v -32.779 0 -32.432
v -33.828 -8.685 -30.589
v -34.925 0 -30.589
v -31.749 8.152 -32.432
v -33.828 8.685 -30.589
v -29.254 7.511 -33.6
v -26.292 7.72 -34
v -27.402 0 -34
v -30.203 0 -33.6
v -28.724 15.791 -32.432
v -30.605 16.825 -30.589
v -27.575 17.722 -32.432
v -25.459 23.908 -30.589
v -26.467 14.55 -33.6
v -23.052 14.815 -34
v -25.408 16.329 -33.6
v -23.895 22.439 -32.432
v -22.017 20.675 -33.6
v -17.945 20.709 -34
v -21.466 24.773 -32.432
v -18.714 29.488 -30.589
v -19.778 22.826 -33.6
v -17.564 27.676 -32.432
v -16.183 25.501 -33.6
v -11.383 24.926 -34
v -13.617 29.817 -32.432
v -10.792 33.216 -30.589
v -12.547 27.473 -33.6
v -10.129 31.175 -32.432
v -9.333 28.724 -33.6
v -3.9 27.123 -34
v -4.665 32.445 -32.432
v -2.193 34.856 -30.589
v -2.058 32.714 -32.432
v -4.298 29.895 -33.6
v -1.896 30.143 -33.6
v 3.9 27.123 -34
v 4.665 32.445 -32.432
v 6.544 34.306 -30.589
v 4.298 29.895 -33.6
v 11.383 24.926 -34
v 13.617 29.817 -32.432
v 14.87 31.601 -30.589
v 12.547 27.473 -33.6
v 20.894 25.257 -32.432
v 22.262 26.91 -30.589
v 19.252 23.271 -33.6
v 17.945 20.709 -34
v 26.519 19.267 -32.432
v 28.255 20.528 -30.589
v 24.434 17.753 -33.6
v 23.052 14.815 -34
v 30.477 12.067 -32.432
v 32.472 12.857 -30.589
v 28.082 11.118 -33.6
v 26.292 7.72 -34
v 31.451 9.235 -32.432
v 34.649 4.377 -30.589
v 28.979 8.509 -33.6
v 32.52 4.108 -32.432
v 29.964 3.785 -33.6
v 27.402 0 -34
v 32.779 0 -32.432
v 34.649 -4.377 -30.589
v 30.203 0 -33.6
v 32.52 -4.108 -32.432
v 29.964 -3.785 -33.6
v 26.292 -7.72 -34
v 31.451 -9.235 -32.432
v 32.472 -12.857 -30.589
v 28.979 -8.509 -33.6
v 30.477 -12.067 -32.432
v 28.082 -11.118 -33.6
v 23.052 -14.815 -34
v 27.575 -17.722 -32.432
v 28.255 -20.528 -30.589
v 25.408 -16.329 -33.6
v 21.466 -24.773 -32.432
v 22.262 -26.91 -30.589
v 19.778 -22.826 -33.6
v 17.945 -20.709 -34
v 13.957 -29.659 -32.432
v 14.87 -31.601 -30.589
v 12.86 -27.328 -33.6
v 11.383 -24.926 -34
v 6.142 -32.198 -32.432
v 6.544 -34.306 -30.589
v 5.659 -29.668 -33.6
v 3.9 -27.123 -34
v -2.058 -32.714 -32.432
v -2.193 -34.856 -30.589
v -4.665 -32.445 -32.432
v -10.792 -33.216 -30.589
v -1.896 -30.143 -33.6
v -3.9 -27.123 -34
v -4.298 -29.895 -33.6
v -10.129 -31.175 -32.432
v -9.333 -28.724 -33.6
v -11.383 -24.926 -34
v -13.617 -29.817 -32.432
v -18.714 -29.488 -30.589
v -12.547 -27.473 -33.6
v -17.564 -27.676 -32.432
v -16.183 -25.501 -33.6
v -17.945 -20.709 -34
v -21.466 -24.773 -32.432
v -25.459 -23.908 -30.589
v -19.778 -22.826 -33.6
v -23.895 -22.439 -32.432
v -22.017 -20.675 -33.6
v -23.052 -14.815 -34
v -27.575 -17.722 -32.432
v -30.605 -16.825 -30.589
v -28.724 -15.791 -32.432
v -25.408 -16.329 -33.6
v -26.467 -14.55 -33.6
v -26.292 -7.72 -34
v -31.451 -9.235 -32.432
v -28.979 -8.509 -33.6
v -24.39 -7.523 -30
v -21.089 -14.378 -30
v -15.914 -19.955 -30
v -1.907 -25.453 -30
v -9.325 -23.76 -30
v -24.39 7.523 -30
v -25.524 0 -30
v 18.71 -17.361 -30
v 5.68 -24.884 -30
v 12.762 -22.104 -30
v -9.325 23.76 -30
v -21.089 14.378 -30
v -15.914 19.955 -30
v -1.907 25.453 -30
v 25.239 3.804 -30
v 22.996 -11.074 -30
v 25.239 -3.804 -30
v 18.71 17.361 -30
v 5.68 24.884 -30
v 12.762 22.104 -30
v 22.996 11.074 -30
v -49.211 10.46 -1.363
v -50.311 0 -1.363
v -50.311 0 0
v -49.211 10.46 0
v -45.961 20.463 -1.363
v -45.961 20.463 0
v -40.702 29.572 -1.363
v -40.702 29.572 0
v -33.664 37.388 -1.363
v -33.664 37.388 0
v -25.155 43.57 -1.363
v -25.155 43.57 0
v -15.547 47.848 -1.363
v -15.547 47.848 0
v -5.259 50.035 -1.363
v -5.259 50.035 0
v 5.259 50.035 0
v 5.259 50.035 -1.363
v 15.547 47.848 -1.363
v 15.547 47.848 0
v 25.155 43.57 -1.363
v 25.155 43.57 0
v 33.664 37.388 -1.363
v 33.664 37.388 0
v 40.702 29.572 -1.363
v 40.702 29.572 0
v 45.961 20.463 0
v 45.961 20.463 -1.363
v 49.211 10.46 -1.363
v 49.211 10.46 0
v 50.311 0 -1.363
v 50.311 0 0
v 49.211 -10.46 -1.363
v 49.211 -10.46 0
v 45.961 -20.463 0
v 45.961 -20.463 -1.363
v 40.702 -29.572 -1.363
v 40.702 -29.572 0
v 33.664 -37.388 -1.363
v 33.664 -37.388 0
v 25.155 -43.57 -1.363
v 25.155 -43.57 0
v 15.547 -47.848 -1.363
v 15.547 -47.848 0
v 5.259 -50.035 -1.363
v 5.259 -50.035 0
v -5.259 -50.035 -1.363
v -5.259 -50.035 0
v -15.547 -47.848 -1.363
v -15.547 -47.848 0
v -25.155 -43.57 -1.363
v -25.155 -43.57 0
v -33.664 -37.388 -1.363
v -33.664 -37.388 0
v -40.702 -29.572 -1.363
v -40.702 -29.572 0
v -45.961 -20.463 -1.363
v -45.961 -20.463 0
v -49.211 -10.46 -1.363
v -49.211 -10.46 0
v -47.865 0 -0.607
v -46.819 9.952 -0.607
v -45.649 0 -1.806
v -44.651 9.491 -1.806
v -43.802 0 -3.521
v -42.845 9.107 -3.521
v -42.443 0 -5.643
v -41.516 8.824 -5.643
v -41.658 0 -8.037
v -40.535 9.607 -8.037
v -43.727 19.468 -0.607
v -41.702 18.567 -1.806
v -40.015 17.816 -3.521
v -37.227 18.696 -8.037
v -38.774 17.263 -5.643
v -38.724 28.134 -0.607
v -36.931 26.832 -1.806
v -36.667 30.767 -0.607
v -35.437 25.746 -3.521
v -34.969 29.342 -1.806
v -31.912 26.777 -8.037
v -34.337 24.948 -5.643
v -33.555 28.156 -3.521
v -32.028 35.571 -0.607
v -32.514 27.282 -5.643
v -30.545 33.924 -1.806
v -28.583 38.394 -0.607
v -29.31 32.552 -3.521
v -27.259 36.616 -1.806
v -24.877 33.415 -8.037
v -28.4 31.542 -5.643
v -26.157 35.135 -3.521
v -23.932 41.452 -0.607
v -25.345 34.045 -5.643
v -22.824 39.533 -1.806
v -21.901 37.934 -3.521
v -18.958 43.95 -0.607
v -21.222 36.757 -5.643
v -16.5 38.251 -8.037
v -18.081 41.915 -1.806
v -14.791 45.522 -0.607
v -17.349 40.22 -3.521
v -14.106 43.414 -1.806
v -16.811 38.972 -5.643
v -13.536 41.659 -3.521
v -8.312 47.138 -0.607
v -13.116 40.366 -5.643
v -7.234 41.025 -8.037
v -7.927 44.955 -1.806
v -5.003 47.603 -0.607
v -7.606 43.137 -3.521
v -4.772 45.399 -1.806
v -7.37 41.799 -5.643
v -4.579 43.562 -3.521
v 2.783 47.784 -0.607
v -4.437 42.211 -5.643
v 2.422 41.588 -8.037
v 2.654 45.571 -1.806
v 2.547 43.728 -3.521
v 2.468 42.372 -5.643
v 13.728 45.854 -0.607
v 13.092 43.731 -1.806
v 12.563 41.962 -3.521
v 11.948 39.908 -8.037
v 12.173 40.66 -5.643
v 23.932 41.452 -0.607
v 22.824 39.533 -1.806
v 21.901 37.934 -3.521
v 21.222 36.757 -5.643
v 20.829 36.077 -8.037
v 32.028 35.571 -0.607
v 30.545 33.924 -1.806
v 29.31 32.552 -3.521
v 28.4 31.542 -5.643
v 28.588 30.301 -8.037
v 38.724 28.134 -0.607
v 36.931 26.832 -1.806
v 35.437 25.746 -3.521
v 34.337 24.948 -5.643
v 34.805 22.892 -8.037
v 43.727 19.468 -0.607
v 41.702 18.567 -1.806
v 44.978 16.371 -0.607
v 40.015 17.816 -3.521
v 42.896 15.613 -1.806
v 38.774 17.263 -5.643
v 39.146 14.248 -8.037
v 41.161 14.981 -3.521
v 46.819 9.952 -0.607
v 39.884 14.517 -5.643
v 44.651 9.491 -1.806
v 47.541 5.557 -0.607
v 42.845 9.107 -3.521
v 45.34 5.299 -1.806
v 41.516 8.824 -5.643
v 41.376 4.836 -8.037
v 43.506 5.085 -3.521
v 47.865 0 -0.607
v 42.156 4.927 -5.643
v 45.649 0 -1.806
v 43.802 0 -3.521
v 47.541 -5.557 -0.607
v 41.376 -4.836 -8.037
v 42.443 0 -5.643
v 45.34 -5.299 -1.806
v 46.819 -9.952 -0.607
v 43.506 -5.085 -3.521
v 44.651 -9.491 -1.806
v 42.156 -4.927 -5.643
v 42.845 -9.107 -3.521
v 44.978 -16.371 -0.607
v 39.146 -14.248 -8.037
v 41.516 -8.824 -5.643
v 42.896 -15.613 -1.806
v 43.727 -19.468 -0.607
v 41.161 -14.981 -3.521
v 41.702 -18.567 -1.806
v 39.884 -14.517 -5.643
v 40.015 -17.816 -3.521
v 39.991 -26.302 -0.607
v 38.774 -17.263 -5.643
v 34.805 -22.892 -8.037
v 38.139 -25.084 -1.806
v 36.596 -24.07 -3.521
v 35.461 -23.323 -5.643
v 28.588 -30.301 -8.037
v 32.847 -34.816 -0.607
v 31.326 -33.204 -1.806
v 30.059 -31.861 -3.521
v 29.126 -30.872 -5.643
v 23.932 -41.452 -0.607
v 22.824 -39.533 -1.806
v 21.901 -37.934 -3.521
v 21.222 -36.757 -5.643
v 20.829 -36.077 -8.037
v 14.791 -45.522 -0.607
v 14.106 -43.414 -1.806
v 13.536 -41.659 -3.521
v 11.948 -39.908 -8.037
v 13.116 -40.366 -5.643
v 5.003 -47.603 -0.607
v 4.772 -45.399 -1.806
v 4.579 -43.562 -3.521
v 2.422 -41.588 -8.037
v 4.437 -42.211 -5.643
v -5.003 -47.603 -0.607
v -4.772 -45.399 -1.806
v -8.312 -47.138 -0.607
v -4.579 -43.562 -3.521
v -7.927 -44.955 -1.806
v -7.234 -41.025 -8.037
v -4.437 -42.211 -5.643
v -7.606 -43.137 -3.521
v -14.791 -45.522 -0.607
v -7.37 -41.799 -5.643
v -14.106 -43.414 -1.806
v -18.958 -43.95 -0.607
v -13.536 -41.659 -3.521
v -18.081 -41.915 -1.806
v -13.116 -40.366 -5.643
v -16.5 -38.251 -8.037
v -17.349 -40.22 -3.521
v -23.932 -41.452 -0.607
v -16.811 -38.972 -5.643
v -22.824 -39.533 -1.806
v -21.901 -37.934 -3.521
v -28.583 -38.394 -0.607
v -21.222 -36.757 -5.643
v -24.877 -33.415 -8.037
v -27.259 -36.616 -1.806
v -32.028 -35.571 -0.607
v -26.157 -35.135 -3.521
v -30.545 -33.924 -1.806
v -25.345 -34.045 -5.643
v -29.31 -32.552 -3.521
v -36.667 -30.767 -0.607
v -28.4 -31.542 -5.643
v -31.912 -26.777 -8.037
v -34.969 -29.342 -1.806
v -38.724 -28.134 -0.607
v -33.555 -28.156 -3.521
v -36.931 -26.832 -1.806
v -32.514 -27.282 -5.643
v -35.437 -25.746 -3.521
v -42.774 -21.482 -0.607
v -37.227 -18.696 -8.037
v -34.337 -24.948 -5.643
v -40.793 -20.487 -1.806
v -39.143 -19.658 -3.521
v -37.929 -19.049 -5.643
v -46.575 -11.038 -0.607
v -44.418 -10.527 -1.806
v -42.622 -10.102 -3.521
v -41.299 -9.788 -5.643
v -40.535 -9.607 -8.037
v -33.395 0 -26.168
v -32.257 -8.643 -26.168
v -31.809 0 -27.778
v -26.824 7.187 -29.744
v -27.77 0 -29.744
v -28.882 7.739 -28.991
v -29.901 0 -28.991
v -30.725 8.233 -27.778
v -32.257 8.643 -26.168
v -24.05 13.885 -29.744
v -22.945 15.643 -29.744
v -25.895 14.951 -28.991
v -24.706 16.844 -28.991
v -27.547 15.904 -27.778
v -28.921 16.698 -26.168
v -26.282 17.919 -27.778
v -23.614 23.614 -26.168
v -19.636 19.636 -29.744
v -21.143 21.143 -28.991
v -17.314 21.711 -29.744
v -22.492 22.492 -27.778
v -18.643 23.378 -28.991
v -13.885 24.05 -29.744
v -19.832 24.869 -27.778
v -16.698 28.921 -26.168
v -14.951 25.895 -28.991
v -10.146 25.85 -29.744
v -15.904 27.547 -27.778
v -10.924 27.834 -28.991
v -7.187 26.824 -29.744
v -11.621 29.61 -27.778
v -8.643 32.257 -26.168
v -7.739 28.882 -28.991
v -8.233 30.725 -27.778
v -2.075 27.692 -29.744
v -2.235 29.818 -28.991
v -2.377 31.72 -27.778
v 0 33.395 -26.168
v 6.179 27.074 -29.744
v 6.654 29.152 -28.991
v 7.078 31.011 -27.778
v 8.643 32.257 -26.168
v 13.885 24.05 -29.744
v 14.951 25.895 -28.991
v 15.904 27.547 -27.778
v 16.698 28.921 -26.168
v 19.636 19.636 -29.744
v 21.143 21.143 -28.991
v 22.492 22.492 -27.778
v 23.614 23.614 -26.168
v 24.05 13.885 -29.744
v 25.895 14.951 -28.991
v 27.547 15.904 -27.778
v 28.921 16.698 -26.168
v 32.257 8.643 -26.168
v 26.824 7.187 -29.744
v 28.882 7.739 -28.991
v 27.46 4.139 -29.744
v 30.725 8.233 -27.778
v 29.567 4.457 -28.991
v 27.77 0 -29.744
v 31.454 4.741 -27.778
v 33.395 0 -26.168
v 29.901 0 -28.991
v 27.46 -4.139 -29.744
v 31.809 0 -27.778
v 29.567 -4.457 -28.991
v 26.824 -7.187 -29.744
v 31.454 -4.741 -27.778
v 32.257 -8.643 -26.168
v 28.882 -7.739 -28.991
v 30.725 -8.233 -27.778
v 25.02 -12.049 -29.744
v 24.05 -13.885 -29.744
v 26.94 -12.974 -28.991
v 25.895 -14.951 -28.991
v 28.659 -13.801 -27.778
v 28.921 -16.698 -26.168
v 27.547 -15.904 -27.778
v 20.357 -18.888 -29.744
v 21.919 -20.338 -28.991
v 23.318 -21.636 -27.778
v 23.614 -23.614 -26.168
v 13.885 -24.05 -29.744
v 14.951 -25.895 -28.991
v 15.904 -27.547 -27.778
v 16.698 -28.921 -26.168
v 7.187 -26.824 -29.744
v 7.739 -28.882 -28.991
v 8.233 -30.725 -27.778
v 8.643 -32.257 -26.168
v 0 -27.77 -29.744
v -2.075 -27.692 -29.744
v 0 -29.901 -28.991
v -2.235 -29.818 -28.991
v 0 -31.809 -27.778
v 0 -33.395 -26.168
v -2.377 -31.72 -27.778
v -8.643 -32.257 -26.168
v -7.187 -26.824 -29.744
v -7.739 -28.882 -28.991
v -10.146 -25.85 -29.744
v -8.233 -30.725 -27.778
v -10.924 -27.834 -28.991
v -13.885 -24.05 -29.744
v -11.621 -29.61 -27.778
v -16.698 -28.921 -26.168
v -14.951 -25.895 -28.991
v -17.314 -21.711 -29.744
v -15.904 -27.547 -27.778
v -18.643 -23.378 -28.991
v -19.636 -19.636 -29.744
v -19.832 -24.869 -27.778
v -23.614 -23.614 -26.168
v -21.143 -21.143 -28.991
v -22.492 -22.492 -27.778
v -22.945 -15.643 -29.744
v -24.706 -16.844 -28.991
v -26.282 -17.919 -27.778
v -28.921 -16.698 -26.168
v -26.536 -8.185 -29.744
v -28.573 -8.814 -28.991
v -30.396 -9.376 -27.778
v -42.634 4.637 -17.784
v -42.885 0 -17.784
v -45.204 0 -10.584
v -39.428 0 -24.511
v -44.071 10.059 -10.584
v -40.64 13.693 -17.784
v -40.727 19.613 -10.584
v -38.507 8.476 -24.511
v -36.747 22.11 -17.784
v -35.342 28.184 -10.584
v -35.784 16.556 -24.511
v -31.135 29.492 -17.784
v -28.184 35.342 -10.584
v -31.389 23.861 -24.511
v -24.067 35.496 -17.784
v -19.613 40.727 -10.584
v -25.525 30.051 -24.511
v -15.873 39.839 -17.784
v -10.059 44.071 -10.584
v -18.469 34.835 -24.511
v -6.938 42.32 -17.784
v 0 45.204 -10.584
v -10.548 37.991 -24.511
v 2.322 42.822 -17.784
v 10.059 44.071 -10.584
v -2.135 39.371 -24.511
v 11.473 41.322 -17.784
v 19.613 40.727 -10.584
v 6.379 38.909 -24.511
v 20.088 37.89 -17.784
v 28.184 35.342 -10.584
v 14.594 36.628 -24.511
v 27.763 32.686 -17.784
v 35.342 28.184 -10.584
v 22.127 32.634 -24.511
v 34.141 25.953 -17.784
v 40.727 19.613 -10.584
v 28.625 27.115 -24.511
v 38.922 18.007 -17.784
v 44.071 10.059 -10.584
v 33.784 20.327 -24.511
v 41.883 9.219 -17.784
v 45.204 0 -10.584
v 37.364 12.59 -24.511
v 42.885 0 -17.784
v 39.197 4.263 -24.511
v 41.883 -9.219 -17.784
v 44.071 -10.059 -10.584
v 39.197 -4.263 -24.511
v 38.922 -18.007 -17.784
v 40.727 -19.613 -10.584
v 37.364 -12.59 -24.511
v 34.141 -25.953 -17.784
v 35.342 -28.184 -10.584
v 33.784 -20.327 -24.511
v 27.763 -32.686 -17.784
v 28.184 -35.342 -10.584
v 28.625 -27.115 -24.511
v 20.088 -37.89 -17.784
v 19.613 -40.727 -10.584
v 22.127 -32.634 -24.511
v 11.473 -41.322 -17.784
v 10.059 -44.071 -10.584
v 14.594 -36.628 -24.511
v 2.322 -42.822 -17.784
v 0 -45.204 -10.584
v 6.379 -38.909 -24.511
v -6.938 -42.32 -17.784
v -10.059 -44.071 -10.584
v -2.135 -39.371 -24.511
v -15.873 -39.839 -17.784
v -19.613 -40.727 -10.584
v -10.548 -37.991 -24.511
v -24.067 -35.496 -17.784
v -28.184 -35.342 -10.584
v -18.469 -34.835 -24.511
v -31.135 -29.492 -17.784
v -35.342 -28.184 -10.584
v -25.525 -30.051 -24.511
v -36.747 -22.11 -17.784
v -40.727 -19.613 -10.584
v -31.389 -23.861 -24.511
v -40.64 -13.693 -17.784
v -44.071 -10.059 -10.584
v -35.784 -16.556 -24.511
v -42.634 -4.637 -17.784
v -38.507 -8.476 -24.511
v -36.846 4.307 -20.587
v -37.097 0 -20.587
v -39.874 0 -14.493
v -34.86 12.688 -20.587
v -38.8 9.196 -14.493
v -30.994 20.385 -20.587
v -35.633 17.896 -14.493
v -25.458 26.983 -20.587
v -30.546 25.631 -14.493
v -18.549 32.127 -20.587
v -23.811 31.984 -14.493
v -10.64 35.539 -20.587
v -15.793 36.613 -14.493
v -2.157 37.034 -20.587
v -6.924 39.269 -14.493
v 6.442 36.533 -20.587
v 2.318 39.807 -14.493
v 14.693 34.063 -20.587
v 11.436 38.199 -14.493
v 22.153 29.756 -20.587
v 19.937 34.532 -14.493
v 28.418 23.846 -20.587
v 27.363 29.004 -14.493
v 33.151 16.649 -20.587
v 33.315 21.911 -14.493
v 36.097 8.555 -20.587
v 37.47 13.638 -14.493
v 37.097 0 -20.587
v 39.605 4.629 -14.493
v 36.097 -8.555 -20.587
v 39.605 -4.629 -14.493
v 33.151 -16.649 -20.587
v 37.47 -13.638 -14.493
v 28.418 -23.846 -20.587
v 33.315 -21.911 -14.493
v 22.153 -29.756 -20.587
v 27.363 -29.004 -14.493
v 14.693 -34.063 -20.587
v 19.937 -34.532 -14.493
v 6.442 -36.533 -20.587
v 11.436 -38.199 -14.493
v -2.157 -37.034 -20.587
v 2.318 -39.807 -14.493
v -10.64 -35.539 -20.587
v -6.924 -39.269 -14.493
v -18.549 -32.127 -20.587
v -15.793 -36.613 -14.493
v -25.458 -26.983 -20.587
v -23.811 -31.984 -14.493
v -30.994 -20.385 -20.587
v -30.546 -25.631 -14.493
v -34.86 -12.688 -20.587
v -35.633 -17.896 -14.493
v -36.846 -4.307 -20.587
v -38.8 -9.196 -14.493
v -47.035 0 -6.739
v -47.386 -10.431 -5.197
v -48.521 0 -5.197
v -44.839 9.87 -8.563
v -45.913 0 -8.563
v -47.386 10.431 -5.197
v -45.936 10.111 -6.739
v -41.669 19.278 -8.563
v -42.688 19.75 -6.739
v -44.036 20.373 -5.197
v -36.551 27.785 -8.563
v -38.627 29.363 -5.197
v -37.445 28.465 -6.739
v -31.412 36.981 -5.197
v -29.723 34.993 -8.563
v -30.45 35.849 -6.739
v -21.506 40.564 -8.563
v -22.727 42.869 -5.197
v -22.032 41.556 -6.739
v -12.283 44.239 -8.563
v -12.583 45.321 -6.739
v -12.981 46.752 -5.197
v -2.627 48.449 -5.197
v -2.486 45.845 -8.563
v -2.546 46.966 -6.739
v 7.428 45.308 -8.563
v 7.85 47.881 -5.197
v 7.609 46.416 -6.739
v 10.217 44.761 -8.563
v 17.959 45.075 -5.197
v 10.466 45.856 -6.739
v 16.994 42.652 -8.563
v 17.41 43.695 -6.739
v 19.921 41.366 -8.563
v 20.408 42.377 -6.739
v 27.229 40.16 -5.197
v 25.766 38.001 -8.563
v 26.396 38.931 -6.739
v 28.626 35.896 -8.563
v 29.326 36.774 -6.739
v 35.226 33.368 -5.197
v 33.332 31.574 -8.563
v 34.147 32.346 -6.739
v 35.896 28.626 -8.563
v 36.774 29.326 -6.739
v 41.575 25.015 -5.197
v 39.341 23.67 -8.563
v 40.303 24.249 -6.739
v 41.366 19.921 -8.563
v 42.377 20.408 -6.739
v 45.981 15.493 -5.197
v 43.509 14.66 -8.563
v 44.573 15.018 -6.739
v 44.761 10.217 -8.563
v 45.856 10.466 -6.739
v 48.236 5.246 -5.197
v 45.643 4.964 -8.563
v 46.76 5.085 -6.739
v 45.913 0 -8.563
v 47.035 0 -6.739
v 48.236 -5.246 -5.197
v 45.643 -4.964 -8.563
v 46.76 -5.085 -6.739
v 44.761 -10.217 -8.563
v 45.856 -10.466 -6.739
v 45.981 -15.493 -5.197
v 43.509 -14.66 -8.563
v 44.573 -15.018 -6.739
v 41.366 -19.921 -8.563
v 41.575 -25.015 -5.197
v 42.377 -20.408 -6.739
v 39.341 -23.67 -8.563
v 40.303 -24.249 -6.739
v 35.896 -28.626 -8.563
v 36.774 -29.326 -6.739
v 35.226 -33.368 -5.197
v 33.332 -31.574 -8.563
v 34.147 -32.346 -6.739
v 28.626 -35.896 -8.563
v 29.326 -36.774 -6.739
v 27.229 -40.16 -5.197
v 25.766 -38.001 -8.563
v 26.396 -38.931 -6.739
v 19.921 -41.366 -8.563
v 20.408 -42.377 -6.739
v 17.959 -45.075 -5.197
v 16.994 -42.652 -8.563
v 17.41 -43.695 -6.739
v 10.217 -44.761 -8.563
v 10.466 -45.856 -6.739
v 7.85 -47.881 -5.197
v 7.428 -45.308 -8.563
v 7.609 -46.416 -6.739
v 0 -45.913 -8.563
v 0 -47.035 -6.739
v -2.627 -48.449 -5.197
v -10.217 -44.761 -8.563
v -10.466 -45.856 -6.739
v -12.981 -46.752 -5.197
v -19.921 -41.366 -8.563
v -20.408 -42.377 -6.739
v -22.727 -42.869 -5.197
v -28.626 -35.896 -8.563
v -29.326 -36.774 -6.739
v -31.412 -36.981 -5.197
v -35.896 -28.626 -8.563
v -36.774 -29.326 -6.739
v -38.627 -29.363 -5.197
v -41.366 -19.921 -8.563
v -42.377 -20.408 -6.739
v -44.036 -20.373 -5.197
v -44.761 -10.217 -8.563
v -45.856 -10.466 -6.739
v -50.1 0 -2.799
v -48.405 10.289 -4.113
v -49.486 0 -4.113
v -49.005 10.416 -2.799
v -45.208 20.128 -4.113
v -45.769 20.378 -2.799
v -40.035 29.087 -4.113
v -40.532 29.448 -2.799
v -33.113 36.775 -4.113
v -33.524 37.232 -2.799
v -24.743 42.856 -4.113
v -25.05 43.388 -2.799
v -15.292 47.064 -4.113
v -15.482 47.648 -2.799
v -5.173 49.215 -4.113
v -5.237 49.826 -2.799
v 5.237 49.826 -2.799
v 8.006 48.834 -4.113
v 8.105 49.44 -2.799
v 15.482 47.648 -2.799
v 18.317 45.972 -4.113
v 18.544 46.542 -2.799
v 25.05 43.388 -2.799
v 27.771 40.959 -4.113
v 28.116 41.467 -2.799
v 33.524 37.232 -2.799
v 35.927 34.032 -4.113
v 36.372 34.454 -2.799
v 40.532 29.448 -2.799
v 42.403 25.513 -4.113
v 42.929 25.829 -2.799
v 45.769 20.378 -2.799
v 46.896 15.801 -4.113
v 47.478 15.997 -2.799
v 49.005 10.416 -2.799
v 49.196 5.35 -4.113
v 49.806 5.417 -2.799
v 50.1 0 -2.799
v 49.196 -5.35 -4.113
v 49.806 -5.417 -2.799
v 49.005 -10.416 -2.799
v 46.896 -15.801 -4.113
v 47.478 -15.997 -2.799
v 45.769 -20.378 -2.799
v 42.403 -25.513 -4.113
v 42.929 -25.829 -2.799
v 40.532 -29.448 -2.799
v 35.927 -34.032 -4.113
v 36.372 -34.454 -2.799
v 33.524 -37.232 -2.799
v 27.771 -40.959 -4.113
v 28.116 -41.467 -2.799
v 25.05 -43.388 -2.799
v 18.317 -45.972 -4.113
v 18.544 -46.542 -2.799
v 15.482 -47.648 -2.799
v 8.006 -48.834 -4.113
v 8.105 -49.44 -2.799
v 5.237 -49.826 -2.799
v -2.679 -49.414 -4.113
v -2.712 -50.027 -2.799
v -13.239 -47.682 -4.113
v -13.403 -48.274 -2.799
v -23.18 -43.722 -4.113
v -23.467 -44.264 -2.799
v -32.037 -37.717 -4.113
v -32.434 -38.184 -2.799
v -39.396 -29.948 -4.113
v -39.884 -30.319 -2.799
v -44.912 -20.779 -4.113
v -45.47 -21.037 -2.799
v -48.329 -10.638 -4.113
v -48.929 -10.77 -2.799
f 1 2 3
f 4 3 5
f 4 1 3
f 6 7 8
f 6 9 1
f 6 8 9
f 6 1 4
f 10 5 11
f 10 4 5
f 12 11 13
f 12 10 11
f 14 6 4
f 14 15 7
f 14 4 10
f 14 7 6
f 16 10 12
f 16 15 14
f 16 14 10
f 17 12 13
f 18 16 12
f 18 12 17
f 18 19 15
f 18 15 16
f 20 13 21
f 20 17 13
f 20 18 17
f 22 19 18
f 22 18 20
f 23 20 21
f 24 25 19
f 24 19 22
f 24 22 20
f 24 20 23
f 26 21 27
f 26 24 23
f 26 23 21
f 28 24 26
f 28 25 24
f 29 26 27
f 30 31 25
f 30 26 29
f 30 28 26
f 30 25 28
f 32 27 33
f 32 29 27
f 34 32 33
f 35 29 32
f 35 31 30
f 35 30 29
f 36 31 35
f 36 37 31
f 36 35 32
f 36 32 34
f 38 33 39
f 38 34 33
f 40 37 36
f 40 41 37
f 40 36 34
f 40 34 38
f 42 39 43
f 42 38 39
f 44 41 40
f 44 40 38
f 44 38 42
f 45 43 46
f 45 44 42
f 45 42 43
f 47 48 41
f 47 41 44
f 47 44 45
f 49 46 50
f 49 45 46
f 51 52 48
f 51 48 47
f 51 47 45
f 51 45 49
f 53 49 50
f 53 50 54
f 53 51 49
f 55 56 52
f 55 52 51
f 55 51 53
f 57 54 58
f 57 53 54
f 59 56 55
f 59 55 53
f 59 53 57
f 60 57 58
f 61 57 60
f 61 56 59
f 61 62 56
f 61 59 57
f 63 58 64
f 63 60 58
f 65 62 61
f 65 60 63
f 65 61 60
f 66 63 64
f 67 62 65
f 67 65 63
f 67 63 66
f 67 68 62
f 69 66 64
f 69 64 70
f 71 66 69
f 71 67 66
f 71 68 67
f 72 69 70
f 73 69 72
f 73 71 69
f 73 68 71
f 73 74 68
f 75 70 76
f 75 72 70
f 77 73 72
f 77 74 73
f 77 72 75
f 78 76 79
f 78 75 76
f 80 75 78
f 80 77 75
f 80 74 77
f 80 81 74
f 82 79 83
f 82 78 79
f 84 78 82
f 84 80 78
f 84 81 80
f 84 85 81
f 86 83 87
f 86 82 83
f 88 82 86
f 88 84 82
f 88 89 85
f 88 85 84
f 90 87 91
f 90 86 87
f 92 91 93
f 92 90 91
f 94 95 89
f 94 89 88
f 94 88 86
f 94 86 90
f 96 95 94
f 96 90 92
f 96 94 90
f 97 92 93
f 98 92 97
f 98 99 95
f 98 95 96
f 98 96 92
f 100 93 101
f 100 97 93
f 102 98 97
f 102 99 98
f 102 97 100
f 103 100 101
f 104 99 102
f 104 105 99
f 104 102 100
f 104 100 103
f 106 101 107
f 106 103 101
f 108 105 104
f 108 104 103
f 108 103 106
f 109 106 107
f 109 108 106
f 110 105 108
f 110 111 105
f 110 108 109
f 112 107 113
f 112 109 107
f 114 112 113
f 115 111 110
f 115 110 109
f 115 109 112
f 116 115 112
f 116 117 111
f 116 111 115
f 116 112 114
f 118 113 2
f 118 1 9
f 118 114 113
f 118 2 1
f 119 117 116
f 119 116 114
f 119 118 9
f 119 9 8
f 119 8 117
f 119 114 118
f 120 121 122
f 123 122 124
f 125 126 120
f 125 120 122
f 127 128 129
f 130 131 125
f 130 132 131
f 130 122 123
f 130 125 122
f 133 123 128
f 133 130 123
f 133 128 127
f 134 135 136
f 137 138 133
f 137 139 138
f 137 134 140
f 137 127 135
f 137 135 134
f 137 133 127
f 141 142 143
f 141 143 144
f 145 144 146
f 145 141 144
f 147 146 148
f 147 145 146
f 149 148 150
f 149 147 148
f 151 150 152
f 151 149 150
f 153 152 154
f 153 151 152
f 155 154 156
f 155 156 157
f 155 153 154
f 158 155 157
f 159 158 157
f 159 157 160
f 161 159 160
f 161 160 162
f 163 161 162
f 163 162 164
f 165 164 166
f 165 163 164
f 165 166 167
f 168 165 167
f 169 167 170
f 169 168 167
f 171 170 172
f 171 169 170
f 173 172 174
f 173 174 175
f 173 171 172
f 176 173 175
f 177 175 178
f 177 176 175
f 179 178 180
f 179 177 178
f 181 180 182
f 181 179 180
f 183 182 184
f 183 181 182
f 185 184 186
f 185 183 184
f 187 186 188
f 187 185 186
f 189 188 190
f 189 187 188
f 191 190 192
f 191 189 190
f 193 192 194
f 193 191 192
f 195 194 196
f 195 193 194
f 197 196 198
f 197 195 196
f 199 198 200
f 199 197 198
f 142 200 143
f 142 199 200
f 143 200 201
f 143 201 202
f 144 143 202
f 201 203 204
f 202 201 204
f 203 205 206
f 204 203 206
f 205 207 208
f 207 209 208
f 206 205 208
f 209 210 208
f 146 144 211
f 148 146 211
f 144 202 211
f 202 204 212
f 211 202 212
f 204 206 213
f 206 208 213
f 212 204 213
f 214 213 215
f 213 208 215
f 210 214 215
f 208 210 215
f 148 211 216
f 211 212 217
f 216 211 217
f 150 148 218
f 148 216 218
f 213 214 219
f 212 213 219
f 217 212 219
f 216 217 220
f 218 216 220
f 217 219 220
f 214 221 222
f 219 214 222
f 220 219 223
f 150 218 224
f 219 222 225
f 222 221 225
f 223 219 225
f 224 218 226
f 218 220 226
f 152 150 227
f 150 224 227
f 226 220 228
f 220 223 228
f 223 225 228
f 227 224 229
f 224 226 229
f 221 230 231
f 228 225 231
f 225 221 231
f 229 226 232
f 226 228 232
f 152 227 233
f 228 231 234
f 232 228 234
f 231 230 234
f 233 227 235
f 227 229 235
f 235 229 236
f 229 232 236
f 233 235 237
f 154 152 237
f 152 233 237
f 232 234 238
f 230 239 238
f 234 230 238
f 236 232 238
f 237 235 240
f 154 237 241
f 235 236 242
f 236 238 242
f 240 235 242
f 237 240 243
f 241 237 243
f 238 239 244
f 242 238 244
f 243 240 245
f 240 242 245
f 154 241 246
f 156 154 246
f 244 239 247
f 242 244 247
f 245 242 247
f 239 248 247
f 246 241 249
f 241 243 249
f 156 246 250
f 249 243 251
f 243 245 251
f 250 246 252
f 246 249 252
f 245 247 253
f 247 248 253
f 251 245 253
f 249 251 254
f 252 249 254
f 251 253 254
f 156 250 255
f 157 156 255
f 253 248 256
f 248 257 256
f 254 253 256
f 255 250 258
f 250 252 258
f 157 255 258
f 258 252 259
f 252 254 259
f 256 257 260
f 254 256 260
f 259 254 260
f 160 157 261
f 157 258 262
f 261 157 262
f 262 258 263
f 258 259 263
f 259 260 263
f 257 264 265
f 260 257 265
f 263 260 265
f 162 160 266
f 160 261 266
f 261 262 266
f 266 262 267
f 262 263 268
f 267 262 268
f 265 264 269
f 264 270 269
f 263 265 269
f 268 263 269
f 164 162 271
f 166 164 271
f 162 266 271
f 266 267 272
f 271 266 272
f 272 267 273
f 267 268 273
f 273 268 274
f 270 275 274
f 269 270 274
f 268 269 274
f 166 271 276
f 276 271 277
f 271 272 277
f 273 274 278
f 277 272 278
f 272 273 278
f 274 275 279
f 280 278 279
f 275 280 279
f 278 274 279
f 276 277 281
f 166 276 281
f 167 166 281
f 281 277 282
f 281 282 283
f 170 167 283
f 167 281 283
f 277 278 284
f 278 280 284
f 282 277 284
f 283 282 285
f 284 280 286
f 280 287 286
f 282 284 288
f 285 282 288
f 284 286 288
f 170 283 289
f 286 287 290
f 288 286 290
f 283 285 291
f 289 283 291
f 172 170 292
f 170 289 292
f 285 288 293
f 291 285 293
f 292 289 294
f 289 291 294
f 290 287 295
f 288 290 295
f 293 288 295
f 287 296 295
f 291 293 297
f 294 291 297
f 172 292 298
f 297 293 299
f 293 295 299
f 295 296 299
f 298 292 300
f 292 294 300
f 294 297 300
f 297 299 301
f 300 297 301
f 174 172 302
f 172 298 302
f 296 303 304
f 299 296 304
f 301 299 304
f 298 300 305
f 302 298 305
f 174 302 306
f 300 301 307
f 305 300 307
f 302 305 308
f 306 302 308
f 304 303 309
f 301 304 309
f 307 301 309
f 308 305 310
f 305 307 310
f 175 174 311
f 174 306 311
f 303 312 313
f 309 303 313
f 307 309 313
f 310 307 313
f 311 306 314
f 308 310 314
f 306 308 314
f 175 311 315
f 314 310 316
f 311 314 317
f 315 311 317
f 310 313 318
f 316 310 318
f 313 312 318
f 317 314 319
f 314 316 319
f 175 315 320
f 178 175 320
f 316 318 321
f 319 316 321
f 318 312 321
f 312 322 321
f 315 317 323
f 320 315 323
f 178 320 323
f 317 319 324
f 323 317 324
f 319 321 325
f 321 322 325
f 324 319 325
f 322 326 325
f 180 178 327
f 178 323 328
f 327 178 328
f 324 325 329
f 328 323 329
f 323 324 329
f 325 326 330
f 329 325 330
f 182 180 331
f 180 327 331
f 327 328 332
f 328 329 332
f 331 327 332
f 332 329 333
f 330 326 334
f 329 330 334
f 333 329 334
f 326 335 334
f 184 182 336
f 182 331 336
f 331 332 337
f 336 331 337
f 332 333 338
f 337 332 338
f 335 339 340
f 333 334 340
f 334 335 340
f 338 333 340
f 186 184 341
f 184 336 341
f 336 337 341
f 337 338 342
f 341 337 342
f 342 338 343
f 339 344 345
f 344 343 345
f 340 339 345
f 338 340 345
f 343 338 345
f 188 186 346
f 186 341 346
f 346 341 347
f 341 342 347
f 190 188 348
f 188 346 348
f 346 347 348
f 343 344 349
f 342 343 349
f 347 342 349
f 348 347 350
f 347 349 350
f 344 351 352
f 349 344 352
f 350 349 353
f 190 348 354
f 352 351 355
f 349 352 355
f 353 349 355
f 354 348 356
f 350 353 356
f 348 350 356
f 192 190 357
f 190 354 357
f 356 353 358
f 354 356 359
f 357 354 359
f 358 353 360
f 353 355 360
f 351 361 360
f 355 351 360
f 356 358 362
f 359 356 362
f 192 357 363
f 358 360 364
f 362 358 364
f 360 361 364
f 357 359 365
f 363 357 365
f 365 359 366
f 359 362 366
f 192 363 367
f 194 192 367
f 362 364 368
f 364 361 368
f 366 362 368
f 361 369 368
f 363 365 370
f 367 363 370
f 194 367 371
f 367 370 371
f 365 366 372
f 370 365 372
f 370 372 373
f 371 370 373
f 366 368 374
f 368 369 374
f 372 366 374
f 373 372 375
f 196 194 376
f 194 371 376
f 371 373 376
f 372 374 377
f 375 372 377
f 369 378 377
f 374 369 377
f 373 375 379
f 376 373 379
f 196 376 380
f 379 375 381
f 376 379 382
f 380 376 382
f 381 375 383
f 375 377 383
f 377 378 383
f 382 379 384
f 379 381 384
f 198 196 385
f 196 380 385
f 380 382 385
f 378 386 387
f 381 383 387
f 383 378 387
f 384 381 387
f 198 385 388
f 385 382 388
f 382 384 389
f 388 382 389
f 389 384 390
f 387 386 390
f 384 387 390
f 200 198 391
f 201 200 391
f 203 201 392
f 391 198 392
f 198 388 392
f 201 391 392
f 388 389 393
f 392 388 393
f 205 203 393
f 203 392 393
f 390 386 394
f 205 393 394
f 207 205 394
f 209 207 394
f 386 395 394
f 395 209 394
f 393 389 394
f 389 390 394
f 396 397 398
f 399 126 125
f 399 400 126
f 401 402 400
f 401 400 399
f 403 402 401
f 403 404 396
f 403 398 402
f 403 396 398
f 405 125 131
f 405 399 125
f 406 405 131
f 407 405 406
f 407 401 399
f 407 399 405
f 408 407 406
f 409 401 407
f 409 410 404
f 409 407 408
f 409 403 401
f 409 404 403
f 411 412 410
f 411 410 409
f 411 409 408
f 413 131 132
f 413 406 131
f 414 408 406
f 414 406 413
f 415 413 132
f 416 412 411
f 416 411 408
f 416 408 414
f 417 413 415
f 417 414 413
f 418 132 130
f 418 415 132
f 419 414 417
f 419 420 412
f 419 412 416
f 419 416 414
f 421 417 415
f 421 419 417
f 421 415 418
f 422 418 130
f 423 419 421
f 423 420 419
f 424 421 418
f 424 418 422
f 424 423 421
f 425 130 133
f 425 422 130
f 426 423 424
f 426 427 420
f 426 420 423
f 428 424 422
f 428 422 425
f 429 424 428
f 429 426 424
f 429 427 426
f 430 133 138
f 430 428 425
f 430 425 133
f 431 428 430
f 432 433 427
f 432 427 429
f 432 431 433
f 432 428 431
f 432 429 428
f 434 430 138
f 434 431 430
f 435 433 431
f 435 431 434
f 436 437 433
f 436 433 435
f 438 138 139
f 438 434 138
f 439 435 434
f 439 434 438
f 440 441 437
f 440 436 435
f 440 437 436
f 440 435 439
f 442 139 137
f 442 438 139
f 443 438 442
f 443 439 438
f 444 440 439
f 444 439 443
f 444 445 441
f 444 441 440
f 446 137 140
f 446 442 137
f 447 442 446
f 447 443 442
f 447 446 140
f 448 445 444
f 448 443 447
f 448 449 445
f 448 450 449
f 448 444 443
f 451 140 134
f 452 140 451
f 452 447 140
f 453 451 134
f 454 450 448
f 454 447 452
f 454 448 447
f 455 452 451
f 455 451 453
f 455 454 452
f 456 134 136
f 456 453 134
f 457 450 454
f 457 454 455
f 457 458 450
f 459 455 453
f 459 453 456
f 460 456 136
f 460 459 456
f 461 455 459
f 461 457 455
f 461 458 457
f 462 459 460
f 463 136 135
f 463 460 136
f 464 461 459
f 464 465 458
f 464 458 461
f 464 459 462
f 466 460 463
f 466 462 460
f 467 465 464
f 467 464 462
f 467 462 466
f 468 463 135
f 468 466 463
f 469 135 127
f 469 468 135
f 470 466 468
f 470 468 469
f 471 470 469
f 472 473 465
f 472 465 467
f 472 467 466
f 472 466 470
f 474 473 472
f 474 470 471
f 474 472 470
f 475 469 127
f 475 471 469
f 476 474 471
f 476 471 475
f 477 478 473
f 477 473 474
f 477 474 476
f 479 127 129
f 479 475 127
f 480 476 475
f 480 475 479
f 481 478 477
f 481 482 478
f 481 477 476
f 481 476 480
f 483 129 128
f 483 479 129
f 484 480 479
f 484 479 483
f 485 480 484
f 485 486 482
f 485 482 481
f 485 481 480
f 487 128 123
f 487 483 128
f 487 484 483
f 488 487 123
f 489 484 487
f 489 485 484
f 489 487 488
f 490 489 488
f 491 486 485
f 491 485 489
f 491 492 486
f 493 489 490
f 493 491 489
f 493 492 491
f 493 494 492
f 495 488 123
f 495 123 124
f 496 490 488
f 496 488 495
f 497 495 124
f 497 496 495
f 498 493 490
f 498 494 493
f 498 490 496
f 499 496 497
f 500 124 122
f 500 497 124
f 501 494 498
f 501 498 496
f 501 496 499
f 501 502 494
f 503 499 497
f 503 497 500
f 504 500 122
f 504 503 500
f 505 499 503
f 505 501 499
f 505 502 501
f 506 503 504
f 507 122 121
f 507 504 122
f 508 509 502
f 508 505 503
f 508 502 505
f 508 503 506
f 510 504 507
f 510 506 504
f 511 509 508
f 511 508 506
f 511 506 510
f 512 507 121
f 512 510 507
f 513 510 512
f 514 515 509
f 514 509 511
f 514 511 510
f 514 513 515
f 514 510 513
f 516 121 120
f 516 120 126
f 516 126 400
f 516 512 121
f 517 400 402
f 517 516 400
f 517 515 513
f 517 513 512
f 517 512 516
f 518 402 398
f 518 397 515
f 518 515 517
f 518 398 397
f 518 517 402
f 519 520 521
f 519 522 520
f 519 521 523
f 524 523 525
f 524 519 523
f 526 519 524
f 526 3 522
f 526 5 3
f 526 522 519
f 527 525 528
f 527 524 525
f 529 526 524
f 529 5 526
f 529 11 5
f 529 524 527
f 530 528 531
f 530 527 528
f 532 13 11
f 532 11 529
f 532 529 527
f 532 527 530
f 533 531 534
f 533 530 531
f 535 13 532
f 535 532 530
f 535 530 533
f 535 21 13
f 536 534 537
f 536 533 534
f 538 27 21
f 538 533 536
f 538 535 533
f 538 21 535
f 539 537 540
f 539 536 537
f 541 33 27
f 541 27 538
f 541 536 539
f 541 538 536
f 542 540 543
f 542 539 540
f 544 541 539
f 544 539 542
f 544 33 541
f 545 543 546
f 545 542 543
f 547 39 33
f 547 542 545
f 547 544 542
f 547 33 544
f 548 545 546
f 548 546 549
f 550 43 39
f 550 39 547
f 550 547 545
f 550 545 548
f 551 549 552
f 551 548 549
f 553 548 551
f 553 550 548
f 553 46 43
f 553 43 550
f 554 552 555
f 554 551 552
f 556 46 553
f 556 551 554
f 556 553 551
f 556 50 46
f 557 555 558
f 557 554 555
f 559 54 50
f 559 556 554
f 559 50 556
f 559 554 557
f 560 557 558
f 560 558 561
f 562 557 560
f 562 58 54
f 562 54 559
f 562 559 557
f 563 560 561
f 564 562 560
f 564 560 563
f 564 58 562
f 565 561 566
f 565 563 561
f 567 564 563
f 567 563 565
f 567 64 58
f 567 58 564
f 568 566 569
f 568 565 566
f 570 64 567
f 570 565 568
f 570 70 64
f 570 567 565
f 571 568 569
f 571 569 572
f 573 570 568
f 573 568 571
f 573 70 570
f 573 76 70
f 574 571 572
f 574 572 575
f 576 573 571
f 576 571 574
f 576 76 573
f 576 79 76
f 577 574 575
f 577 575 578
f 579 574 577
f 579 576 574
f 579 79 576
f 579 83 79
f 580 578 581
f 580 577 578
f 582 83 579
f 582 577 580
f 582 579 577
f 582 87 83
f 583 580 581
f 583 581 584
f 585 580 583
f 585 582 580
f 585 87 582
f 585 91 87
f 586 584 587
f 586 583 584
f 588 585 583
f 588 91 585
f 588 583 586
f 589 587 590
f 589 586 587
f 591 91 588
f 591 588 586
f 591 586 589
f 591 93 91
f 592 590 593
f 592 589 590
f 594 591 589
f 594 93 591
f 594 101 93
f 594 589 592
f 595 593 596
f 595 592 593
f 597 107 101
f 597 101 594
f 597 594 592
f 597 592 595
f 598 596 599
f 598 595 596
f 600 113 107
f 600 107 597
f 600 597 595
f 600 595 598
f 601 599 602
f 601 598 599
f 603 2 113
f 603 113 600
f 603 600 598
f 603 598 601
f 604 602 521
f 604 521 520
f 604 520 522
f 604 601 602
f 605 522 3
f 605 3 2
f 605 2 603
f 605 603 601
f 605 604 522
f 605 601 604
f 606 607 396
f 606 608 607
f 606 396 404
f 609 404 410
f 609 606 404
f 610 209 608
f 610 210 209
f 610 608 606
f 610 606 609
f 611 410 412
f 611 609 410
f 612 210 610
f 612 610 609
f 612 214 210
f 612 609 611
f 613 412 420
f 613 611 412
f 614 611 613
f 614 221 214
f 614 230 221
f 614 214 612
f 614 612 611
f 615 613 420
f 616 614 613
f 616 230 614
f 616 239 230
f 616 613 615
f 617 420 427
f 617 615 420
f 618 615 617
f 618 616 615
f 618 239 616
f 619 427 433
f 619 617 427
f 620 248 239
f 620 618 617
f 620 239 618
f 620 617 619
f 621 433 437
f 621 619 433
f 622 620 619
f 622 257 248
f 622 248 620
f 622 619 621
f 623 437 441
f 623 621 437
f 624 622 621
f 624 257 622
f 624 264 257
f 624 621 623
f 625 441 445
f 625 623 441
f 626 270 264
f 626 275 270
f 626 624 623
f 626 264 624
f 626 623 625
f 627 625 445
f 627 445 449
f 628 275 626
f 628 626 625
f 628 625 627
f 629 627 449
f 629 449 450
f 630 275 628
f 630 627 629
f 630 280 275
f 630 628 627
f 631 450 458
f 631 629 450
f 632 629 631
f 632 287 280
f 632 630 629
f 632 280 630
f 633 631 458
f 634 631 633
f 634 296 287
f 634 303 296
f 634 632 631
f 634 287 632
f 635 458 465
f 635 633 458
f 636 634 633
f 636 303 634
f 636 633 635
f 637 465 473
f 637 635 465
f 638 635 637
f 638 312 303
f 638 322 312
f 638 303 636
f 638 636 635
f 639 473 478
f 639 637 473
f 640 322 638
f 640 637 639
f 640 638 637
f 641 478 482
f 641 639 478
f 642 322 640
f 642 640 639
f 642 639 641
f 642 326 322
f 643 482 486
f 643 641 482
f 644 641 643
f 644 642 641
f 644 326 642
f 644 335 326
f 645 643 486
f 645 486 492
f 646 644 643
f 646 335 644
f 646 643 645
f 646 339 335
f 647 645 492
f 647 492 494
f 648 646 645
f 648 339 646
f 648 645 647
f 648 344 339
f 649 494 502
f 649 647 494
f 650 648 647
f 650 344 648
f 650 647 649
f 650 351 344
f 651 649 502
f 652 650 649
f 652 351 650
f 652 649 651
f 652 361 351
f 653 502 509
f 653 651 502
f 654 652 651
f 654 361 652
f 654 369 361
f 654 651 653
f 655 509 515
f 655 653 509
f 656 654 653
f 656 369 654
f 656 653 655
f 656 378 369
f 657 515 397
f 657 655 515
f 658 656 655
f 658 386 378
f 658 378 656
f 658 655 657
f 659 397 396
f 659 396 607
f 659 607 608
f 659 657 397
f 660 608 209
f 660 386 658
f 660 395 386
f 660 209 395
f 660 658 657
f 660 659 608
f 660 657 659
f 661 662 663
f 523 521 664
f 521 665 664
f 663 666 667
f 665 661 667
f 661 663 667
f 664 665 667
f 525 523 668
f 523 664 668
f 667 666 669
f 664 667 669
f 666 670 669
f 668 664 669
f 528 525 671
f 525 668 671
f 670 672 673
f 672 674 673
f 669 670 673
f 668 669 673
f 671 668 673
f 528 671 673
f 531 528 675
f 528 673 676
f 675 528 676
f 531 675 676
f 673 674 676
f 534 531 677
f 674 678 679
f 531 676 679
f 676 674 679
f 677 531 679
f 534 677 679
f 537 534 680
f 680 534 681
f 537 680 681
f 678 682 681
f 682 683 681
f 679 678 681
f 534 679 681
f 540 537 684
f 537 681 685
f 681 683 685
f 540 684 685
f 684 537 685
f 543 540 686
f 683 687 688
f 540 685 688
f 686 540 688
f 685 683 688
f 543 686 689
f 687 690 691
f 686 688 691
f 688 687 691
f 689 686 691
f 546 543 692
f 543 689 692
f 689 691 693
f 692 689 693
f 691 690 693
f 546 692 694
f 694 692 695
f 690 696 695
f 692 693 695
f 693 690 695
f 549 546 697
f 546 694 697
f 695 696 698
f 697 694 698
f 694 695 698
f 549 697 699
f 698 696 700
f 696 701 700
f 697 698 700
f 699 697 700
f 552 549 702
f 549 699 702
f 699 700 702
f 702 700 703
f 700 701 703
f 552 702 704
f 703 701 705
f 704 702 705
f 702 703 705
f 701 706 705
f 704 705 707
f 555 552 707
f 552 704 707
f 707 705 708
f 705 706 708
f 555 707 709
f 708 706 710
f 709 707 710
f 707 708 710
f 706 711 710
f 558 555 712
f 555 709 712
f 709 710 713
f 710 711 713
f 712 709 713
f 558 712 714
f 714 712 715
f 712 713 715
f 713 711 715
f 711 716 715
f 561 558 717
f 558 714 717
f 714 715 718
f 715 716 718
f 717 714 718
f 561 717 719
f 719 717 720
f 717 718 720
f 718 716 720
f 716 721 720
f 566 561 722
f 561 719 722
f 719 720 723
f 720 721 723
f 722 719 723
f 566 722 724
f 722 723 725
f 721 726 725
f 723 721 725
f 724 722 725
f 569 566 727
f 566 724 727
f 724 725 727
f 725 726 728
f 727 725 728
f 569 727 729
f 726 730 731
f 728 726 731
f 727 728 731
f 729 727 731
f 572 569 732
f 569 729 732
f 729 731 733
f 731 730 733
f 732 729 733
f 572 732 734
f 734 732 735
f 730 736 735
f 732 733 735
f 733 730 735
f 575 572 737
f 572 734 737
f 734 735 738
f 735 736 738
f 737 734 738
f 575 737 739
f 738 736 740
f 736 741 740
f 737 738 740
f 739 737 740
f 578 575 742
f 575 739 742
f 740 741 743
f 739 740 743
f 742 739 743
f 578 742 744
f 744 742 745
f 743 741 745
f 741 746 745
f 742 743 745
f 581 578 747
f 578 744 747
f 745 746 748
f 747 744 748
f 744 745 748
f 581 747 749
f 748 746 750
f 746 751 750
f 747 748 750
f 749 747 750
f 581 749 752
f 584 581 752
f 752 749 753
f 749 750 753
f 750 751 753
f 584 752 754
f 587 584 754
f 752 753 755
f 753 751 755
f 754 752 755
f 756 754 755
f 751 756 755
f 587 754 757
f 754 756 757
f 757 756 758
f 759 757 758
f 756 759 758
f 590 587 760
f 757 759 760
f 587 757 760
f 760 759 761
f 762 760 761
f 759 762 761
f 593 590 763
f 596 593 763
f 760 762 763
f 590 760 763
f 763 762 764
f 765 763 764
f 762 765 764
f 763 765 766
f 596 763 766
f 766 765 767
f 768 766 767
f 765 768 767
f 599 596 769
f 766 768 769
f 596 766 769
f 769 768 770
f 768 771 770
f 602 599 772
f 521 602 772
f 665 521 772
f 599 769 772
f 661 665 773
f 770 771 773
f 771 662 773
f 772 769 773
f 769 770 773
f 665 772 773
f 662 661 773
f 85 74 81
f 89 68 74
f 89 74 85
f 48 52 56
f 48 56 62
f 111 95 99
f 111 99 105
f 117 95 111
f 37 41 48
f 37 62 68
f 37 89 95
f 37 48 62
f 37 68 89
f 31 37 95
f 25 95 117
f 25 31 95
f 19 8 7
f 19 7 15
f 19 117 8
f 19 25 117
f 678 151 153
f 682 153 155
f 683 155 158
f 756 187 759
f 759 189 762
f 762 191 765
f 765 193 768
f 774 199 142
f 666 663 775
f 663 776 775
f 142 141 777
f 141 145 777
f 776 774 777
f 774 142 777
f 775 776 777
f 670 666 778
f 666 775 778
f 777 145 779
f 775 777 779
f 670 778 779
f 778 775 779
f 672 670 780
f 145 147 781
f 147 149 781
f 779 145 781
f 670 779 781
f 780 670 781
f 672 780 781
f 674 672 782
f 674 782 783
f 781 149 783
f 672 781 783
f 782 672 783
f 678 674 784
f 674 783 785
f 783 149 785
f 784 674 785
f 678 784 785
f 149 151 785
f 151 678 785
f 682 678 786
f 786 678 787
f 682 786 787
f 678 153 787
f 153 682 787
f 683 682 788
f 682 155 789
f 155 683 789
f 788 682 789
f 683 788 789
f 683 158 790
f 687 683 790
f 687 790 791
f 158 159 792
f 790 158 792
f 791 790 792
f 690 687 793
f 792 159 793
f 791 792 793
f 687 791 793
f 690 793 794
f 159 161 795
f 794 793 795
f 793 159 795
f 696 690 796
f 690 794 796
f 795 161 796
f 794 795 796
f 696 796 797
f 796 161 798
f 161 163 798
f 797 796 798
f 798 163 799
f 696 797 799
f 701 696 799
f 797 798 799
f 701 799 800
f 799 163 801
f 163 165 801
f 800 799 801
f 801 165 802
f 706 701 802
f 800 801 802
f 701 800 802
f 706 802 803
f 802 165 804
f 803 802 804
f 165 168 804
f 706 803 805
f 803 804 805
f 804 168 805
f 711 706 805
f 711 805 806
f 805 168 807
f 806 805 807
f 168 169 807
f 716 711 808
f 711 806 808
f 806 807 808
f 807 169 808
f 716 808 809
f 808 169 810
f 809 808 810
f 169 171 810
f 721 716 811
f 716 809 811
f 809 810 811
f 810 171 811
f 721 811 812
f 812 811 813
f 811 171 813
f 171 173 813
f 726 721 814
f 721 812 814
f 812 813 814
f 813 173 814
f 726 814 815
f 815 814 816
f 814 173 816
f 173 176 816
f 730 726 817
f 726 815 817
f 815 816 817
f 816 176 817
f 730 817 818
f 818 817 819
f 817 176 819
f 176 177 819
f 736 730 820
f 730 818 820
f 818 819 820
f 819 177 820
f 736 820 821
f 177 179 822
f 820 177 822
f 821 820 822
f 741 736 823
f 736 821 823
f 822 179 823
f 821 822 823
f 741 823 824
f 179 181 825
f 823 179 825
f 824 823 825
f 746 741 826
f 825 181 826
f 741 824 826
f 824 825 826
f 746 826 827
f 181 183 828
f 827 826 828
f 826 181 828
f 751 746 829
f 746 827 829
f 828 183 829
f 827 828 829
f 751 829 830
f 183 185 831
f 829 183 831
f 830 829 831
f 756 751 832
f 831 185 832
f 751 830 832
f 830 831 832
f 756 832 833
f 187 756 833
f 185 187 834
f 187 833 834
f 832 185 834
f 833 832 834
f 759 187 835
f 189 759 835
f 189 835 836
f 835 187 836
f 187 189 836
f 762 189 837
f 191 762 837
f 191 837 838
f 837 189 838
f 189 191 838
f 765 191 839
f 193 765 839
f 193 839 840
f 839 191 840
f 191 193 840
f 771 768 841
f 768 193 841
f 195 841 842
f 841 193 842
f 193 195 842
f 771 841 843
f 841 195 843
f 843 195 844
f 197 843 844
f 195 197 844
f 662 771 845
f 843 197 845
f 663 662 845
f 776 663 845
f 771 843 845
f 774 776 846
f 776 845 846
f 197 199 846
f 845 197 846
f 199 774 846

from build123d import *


# Not quite as in the source:
# - a fillet or chamfer that OpenCascade refuses, or shapes differently, is made with other operations: its cross-section is extruded or revolved along the edge and cut away or added


with BuildPart() as f1:
    # F0 (on Front) → F1 (revolve)
    with BuildSketch(Plane.XZ):
        with BuildLine():
            Line((0, -34), (0, -30))
            Line((0, -30), (-30, -30))
            ThreePointArc((-30, -30), (-39.1968889463, -16.2358830044), (-42.4264068712, 0))
            Line((-42.4264068712, 0), (-50.3107011318, 0))
            Line((-50.3107011318, 0), (-50.3107011318, -4))
            Line((-50.3107011318, -4), (-46.2537701703, -4))
            ThreePointArc((-46.2537701703, -4), (-41.7232145336, -20.361351231), (-31.6134663549, -34))
            Line((-31.6134663549, -34), (0, -34))
        make_face()
    revolve(axis=Axis((0, 0, -15), (0, 0, -1)))

    # F2: fillet of radius 10 on 4 edges, made by hand

    # F2_s1 → F2_t2 (revolve)
    with BuildSketch(Plane.XZ):
        with BuildLine():
            ThreePointArc((-25.5239468456, -30), (-29.9012676169, -28.9910546025), (-33.395292859, -26.1678125731))
            ThreePointArc((-33.395292859, -26.1678125731), (-31.7555066766, -28.135170085), (-30, -30))
            Line((-30, -30), (-25.5239468456, -30))
        make_face()
    revolve(axis=Axis((0, 0, -30), (0, 0, -1)))

    # F2_s3 → F2_t4 (revolve)
    with BuildSketch(Plane.XZ):
        with BuildLine():
            ThreePointArc((-45.2038898575, -10.5839310619), (-47.0388945384, -6.73473945), (-50.3107011318, -4))
            Line((-50.3107011318, -4), (-46.2537701703, -4))
            ThreePointArc((-46.2537701703, -4), (-45.8471692855, -7.310836031), (-45.2038898575, -10.5839310619))
        make_face()
    revolve(axis=Axis((0, 0, -4), (0, 0, -1)))

    # F2_s5 → F2_t6 (revolve, cut)
    with BuildSketch(Plane.XZ):
        with BuildLine():
            ThreePointArc((-50.3107011318, 0), (-44.671276634, -2.6050008536), (-41.6581484398, -8.0373296912))
            ThreePointArc((-41.6581484398, -8.0373296912), (-42.2339055452, -4.0369818424), (-42.4264068712, 0))
            Line((-42.4264068712, 0), (-50.3107011318, 0))
        make_face()
    revolve(axis=Axis((0, 0, 0), (0, 0, -1)), mode=Mode.SUBTRACT)

    # F2_s7 → F2_t8 (revolve, cut)
    with BuildSketch(Plane.XZ):
        with BuildLine():
            ThreePointArc((-34.9248789027, -30.5886267852), (-31.5322424712, -33.1073121131), (-27.4022465784, -34))
            Line((-27.4022465784, -34), (-31.6134663549, -34))
            ThreePointArc((-31.6134663549, -34), (-33.3128685977, -32.3367289744), (-34.9248789027, -30.5886267852))
        make_face()
    revolve(axis=Axis((0, 0, -34), (0, 0, -1)), mode=Mode.SUBTRACT)

    # F3: fillet of radius 5 on 2 edges, made by hand

    # F3_s1 → F3_t2 (revolve, cut)
    with BuildSketch(Plane.XZ):
        with BuildLine():
            ThreePointArc((-48.5206561627, -5.1965315899), (-49.8411412404, -3.478416904), (-50.3107011318, -1.3629707518))
            Line((-50.3107011318, -1.3629707518), (-50.3107011318, -4))
            ThreePointArc((-50.3107011318, -4), (-49.3833812624, -4.5499479973), (-48.5206561627, -5.1965315899))
        make_face()
    revolve(axis=Axis((0, 0, -4), (0, 0, -1)), mode=Mode.SUBTRACT)


solid = f1.part
